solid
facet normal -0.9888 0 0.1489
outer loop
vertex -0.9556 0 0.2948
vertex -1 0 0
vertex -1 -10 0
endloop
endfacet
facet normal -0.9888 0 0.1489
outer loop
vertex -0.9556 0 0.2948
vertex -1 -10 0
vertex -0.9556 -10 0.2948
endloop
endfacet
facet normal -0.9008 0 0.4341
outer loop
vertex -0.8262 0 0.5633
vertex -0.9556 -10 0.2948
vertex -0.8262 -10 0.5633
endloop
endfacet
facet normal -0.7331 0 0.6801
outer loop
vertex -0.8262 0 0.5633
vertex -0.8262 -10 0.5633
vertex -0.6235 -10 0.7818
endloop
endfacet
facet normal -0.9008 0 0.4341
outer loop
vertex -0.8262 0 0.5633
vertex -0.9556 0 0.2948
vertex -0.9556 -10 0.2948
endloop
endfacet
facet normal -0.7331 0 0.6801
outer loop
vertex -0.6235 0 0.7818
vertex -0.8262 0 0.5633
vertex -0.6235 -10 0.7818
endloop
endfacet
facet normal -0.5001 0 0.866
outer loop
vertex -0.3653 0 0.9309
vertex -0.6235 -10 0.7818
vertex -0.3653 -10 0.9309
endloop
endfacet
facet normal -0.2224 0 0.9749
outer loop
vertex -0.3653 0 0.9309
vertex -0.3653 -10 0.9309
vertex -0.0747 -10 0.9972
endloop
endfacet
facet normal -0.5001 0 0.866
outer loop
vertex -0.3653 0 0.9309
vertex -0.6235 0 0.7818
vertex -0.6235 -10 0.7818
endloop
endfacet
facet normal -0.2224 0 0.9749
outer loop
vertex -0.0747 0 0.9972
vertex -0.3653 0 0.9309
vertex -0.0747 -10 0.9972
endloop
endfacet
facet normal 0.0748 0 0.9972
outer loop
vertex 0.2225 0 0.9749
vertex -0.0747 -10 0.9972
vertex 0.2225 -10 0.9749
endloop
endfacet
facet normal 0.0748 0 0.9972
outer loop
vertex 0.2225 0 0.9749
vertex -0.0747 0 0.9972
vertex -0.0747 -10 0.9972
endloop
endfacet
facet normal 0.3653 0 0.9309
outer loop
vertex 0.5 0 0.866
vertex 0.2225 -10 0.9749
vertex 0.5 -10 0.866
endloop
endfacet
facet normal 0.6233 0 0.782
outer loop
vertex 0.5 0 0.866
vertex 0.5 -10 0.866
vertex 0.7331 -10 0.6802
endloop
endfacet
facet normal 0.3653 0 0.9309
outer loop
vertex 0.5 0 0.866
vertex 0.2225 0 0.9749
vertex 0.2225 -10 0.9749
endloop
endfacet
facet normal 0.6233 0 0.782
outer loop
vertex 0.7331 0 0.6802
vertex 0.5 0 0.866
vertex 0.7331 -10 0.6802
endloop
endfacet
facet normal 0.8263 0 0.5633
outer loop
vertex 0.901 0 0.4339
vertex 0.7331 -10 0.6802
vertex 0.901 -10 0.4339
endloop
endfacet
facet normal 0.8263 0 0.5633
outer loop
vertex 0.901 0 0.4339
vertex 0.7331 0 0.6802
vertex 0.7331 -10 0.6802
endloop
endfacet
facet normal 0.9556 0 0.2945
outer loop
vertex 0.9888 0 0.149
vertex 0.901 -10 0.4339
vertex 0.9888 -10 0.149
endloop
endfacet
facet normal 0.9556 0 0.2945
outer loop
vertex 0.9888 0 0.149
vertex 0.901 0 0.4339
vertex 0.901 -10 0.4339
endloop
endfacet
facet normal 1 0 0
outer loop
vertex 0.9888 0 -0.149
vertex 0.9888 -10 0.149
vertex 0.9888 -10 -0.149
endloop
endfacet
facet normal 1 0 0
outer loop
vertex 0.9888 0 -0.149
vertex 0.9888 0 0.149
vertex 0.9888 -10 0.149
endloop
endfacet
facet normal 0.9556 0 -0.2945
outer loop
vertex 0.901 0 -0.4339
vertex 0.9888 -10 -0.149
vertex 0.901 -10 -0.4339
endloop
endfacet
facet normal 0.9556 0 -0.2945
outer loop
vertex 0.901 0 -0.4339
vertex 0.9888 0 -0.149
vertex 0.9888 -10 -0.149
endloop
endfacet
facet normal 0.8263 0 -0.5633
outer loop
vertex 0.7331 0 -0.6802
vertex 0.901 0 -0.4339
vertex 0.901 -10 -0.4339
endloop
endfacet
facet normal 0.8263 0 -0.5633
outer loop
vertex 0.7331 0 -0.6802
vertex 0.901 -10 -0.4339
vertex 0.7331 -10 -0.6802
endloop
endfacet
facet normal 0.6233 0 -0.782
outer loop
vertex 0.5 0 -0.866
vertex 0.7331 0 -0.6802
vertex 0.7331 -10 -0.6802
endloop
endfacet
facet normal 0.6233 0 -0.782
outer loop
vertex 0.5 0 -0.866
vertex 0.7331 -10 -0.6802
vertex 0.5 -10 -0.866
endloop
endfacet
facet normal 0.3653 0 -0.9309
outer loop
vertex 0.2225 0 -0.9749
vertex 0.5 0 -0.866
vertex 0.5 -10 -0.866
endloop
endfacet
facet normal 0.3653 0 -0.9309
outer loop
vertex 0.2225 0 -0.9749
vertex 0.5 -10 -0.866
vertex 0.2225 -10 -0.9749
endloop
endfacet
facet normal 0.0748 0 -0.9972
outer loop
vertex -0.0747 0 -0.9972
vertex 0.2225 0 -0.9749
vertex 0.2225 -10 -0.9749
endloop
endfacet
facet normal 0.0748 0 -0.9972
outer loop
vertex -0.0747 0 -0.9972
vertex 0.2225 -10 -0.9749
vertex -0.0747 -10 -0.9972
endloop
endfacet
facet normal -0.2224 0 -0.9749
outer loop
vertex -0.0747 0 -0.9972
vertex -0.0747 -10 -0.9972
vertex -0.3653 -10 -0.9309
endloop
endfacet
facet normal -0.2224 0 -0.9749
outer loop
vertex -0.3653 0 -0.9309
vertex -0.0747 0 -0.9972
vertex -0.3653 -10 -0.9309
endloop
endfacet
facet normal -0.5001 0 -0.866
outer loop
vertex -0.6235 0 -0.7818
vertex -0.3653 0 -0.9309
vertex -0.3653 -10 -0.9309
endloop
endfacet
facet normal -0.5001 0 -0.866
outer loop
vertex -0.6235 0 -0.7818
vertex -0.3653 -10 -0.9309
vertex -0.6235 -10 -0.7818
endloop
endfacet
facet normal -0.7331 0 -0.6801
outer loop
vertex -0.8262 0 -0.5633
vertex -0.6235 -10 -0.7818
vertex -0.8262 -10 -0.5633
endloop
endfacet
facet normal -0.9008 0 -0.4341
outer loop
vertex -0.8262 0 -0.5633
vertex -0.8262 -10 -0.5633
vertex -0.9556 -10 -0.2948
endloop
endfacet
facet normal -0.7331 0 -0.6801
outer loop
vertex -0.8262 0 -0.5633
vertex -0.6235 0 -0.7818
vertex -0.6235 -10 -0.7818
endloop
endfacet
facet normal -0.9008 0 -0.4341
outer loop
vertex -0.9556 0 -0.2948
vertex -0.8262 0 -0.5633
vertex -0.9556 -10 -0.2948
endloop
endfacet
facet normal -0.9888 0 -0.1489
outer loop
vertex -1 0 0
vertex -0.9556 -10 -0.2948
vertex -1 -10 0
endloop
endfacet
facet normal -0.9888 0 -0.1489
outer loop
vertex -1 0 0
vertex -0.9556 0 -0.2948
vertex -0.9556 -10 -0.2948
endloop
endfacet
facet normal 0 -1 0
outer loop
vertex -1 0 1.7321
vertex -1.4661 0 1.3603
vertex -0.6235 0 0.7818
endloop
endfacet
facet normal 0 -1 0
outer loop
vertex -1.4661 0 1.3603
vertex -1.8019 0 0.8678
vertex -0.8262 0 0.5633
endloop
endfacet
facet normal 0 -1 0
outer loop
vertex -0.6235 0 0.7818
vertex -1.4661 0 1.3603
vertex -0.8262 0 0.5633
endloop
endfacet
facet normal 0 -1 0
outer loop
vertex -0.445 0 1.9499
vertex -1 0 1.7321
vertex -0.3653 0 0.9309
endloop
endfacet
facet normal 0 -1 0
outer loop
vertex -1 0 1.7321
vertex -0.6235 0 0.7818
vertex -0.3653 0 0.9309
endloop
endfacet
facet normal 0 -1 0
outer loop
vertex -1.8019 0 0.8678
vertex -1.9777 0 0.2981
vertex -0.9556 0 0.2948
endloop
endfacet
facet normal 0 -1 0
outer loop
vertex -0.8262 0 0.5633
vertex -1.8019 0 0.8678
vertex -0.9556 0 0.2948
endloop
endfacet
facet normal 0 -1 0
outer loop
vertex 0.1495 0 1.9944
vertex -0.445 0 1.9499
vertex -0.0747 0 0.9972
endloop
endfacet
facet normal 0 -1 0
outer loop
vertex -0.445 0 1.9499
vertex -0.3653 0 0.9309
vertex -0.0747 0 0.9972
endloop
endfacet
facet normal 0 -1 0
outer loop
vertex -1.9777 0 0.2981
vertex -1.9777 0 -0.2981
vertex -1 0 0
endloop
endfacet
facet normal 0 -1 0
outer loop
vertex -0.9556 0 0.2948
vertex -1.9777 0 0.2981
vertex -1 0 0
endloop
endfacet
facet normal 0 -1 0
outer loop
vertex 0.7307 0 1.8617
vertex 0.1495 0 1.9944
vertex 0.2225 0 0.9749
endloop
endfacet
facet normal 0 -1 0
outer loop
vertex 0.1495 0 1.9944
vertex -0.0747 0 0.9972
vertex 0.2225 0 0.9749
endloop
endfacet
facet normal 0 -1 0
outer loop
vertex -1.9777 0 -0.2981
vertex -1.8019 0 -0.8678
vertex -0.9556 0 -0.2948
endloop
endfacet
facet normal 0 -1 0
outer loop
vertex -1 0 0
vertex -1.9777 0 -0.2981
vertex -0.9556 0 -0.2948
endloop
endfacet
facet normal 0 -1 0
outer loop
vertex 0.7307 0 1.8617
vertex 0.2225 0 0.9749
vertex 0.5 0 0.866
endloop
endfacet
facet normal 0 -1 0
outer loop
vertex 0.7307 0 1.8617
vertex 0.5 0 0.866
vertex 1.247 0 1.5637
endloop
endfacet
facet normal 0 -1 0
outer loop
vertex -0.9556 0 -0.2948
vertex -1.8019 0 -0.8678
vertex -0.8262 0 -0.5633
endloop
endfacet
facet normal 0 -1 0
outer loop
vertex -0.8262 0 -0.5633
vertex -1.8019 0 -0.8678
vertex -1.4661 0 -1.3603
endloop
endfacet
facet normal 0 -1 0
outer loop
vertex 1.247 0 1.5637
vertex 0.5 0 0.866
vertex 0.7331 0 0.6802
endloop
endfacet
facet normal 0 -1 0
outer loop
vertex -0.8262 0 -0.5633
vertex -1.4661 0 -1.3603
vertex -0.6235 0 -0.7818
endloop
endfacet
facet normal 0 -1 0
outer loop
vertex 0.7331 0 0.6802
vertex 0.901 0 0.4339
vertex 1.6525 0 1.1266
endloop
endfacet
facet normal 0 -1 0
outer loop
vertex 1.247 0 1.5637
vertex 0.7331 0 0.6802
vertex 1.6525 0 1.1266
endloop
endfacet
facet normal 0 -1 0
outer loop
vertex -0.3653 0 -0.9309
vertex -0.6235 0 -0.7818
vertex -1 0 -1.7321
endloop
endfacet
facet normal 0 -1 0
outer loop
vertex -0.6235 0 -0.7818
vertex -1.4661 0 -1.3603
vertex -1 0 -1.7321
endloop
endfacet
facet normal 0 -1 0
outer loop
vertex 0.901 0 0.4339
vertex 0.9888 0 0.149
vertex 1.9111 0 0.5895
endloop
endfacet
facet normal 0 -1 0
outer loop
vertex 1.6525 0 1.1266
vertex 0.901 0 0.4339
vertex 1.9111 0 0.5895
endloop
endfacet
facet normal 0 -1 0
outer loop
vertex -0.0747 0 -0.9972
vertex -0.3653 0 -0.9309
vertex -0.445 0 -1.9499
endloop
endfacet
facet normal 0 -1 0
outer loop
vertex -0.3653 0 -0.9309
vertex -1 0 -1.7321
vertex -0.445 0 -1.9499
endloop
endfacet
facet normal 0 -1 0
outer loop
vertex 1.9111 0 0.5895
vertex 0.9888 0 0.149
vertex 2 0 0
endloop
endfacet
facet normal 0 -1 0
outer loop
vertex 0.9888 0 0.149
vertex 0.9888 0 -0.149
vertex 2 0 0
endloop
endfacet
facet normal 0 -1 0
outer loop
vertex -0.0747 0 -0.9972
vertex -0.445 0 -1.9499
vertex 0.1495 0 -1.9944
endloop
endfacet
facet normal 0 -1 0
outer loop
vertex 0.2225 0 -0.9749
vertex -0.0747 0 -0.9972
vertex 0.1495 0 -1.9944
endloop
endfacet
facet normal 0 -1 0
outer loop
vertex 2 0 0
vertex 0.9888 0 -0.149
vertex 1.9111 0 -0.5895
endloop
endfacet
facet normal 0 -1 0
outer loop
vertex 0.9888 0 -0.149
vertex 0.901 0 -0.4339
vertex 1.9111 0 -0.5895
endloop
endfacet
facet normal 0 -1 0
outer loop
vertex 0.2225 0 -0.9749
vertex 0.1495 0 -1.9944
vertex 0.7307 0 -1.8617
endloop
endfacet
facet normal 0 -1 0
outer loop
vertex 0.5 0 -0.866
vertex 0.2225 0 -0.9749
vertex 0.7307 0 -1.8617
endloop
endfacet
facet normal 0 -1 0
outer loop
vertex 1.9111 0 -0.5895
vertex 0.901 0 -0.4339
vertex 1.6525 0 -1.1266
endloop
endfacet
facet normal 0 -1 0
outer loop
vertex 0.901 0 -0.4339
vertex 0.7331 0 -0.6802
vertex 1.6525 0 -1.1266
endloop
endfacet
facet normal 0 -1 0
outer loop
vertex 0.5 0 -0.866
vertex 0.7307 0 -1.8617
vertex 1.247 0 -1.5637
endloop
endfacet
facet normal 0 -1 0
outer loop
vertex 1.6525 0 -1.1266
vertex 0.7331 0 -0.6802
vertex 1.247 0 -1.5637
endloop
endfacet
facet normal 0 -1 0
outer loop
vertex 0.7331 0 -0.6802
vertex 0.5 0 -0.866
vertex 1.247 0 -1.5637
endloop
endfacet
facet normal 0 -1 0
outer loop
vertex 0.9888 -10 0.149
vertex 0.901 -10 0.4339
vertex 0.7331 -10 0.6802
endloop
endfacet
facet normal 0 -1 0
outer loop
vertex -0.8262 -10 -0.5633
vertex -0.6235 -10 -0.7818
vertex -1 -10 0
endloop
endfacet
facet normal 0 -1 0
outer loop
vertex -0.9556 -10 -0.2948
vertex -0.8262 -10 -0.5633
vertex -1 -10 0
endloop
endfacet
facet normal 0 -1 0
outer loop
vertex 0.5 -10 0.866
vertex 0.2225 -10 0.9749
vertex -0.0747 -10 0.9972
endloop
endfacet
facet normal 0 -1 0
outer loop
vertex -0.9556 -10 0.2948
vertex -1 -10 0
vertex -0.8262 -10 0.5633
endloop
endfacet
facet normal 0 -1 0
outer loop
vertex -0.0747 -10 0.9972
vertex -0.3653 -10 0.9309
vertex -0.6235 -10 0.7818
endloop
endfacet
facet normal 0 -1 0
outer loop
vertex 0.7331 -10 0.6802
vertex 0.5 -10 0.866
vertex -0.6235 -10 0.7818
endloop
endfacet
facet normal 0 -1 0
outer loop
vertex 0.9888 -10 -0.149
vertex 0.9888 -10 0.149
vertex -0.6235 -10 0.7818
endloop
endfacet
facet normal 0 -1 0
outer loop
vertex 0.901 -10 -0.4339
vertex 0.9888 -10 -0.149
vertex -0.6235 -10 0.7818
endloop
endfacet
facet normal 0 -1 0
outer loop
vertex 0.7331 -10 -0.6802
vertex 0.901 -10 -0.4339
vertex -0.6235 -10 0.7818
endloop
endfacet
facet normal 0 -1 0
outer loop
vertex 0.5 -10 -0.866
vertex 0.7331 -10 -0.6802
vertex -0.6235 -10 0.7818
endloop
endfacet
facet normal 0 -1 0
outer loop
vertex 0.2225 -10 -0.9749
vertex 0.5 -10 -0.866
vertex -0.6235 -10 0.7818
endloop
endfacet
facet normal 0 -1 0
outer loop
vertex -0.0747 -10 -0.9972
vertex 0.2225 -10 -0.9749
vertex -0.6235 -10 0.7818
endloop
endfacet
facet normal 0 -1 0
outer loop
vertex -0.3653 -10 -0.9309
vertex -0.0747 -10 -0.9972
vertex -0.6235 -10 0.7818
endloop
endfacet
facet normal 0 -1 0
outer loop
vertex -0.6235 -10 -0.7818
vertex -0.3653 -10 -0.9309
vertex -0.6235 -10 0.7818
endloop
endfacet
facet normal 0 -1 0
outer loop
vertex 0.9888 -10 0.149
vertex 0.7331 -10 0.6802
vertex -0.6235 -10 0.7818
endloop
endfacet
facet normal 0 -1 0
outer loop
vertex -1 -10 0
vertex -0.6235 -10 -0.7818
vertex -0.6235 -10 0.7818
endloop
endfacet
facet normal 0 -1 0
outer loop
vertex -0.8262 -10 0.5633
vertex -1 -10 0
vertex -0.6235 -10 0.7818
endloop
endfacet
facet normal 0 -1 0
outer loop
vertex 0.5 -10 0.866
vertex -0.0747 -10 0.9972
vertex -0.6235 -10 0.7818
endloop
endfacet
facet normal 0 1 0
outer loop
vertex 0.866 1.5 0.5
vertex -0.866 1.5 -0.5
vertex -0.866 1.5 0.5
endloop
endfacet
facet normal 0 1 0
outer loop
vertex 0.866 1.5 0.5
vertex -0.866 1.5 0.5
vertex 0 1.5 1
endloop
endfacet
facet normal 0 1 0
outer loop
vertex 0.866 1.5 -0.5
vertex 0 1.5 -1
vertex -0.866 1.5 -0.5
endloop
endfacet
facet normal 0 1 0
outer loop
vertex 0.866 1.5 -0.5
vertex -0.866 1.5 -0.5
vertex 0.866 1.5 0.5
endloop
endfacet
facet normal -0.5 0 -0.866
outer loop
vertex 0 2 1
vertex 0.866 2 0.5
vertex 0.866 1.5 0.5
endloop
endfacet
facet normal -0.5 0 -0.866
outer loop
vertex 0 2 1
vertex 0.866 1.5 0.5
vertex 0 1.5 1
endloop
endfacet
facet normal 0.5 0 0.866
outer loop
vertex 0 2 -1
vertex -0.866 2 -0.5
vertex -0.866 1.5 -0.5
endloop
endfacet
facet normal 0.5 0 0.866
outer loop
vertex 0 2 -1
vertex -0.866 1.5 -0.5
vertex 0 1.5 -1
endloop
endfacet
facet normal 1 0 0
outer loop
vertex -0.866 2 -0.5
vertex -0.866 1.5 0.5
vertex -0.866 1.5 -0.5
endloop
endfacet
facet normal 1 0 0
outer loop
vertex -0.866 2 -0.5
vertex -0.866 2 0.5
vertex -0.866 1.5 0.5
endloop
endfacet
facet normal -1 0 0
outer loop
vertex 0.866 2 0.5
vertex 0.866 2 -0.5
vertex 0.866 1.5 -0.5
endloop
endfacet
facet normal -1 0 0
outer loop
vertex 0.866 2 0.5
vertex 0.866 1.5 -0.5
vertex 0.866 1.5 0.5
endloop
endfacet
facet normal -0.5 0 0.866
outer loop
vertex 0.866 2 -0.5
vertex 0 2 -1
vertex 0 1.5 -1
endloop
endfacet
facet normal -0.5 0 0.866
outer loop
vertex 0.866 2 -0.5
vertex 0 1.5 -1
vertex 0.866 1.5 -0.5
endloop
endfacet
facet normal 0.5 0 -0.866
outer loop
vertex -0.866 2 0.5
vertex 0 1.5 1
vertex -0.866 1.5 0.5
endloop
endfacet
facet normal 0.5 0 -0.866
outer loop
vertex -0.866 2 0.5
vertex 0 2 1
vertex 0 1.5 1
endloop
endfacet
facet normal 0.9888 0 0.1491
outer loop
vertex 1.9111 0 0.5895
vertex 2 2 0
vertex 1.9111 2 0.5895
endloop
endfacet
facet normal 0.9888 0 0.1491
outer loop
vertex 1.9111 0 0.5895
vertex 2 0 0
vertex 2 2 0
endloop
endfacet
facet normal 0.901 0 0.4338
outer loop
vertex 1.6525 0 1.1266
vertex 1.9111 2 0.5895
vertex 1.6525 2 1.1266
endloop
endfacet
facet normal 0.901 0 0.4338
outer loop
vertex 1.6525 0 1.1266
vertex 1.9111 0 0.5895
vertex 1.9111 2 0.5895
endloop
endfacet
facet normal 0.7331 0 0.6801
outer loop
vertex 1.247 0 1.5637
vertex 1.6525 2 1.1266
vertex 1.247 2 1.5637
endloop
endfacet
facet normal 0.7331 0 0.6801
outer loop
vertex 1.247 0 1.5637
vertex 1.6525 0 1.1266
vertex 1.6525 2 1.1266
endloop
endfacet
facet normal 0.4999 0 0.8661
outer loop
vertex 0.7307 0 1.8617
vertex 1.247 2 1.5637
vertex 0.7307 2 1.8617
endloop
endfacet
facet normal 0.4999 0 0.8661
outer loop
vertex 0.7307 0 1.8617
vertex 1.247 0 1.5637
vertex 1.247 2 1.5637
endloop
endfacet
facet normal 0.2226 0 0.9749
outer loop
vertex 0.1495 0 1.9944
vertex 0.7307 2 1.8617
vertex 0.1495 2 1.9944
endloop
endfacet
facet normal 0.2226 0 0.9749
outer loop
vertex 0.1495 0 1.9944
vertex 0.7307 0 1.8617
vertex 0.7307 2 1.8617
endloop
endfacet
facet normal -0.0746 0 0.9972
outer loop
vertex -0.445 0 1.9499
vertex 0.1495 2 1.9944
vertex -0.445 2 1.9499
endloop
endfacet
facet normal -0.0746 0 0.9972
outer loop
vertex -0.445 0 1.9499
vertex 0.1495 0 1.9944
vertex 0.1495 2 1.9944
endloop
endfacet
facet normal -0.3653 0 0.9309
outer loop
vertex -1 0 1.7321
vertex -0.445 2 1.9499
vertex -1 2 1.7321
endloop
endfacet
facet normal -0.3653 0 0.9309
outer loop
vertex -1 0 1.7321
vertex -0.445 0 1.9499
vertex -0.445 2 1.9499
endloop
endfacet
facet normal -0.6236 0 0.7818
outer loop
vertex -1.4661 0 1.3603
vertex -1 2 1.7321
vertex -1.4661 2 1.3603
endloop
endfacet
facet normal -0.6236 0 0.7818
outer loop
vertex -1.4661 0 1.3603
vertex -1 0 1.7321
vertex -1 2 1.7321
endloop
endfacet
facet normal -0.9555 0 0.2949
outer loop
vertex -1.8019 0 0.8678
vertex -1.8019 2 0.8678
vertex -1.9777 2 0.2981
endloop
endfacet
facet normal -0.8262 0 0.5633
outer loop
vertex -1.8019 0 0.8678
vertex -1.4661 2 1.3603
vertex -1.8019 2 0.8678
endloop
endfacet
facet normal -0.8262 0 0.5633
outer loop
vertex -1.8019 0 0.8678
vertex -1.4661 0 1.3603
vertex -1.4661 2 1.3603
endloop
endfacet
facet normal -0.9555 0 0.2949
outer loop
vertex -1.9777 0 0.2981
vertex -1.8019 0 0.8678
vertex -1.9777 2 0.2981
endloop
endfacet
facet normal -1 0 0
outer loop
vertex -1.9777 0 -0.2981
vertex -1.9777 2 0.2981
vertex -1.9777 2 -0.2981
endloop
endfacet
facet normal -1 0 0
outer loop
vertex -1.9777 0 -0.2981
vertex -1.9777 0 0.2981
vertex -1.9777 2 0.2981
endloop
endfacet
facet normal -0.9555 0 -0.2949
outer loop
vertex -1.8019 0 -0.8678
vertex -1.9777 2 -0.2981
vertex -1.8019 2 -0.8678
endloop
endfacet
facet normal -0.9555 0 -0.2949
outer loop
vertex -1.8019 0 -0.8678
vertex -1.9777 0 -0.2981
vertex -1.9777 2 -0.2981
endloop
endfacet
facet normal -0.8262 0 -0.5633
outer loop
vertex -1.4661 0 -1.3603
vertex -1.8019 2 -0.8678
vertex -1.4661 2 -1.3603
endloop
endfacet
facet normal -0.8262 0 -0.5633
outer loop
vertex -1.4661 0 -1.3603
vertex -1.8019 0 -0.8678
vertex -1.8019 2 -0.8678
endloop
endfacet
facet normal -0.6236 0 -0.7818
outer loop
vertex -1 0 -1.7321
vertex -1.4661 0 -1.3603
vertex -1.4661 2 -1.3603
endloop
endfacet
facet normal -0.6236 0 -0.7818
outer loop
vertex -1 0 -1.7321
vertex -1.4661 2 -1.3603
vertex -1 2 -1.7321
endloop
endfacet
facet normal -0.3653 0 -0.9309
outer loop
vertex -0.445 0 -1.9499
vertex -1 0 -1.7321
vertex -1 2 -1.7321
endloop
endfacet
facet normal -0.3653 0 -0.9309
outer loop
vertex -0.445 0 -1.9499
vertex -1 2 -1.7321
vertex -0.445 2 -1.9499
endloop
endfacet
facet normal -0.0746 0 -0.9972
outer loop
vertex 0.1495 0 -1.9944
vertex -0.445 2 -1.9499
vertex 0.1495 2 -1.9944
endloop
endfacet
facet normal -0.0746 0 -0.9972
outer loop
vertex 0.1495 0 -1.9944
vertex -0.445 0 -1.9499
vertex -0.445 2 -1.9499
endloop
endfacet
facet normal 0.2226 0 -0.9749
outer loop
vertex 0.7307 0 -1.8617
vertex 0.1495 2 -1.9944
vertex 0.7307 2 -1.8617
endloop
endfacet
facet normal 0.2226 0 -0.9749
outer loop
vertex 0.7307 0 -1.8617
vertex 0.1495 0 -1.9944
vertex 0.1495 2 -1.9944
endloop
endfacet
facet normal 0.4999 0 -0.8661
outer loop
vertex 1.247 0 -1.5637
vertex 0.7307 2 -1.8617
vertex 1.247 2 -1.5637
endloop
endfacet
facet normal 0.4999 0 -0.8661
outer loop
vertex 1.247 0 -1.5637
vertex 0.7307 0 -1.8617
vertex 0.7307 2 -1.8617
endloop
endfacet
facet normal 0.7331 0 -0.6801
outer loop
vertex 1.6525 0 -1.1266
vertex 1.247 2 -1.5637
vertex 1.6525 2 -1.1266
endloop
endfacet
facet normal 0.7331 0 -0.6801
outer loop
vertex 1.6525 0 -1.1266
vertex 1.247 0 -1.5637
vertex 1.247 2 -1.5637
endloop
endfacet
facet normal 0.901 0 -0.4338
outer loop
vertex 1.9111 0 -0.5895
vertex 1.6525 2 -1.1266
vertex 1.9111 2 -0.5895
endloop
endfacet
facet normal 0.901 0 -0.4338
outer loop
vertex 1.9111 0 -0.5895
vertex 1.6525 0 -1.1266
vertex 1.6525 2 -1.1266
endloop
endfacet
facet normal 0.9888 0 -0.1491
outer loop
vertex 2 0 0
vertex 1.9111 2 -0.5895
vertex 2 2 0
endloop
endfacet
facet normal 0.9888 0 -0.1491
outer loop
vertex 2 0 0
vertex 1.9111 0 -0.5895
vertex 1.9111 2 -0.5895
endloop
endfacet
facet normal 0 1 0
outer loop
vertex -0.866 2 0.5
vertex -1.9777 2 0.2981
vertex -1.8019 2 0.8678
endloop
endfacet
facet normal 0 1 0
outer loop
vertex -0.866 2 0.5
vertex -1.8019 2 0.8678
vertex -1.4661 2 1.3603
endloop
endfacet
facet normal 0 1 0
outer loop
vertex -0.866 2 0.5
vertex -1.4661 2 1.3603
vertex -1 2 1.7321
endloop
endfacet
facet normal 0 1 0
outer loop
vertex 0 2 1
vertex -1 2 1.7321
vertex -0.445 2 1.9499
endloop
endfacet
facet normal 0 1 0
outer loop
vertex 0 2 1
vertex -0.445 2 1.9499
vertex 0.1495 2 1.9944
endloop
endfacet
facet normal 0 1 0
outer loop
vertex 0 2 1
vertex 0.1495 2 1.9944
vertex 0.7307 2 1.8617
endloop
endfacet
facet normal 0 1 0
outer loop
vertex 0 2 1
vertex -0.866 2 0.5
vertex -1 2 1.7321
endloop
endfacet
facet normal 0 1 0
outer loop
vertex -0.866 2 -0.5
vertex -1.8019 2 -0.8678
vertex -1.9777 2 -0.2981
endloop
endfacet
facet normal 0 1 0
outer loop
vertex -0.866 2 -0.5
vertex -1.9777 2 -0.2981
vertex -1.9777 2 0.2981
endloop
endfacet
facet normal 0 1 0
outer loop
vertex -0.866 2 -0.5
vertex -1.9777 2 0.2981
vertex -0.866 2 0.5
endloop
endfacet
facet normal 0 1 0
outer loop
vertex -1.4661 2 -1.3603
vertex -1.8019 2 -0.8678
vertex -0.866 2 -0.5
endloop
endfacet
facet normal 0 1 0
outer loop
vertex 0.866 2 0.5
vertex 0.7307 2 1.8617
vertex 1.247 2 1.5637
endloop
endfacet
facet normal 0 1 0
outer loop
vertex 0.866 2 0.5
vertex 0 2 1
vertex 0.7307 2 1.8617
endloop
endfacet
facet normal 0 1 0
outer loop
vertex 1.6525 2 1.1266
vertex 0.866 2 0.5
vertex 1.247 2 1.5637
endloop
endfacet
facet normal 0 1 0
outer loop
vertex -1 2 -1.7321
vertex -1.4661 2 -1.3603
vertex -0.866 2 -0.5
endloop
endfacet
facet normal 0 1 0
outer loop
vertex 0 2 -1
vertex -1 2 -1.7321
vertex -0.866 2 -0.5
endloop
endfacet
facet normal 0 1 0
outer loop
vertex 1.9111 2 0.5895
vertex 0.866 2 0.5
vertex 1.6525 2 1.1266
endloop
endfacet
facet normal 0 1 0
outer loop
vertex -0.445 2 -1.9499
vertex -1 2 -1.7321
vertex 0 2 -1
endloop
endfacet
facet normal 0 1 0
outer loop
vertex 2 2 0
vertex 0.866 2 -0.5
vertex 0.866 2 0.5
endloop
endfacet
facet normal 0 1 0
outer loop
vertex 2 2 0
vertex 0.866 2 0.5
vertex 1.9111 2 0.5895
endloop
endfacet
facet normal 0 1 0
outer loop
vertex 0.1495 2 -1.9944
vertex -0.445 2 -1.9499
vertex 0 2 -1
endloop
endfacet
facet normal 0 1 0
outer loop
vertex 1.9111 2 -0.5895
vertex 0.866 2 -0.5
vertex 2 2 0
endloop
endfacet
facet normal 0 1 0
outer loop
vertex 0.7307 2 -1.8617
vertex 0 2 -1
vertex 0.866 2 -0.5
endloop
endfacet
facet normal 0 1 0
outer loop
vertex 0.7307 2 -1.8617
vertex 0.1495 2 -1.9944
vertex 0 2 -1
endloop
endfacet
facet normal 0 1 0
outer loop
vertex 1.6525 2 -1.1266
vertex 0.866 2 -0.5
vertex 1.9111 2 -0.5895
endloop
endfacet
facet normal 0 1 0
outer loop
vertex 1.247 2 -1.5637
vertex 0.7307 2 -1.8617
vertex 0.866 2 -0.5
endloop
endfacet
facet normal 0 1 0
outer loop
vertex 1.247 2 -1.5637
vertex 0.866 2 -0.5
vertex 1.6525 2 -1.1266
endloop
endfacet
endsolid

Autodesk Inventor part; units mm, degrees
ref_plane "YZ Plane" through (0, 0, 0) normal (1, 0, 0) x (0, 1, 0)
ref_plane "XZ Plane" through (0, 0, 0) normal (0, 1, 0) x (-1, 0, 0)
ref_plane "XY Plane" through (0, 0, 0) normal (0, 0, 1) x (1, 0, 0)
sketch "Sketch1" plane through (0, 0, 0) normal (0, 1, 0) x (-1, 0, 0)
  circle A0 centre (0, 0) radius 2.5
  circle A1 centre (0, 0) radius 1
  dimension "d0" = 5
extrude "Extrusion1" add sketch "Sketch1" against normal blind 10 contours A1
sketch "Sketch2" plane through (0, 0, 0) normal (0, 1, 0) x (1, 0, 0)
  circle A0 centre (0, 0) radius 2
  dimension "d3" = 4
extrude "Extrusion2" add sketch "Sketch2" along normal blind 2
sketch "Sketch3" plane through (0, 2, 0) normal (0, 1, 0) x (1, 0, 0)
  circle A0 centre (0, 0) radius 1 projected
  line L0 (0, 1) -> (0.866, 0.5)
  line L1 (0.866, 0.5) -> (0.866, -0.5)
  line L2 (0.866, -0.5) -> (0, -1)
  line L3 (0, -1) -> (-0.866, -0.5)
  line L4 (-0.866, -0.5) -> (-0.866, 0.5)
  line L5 (-0.866, 0.5) -> (0, 1)
extrude "Extrusion3" cut sketch "Sketch3" against normal blind 0.5 contours L1 L2 L3 L4 L5 L0
properties part number "4mm_screw" material "Stainless Steel"
